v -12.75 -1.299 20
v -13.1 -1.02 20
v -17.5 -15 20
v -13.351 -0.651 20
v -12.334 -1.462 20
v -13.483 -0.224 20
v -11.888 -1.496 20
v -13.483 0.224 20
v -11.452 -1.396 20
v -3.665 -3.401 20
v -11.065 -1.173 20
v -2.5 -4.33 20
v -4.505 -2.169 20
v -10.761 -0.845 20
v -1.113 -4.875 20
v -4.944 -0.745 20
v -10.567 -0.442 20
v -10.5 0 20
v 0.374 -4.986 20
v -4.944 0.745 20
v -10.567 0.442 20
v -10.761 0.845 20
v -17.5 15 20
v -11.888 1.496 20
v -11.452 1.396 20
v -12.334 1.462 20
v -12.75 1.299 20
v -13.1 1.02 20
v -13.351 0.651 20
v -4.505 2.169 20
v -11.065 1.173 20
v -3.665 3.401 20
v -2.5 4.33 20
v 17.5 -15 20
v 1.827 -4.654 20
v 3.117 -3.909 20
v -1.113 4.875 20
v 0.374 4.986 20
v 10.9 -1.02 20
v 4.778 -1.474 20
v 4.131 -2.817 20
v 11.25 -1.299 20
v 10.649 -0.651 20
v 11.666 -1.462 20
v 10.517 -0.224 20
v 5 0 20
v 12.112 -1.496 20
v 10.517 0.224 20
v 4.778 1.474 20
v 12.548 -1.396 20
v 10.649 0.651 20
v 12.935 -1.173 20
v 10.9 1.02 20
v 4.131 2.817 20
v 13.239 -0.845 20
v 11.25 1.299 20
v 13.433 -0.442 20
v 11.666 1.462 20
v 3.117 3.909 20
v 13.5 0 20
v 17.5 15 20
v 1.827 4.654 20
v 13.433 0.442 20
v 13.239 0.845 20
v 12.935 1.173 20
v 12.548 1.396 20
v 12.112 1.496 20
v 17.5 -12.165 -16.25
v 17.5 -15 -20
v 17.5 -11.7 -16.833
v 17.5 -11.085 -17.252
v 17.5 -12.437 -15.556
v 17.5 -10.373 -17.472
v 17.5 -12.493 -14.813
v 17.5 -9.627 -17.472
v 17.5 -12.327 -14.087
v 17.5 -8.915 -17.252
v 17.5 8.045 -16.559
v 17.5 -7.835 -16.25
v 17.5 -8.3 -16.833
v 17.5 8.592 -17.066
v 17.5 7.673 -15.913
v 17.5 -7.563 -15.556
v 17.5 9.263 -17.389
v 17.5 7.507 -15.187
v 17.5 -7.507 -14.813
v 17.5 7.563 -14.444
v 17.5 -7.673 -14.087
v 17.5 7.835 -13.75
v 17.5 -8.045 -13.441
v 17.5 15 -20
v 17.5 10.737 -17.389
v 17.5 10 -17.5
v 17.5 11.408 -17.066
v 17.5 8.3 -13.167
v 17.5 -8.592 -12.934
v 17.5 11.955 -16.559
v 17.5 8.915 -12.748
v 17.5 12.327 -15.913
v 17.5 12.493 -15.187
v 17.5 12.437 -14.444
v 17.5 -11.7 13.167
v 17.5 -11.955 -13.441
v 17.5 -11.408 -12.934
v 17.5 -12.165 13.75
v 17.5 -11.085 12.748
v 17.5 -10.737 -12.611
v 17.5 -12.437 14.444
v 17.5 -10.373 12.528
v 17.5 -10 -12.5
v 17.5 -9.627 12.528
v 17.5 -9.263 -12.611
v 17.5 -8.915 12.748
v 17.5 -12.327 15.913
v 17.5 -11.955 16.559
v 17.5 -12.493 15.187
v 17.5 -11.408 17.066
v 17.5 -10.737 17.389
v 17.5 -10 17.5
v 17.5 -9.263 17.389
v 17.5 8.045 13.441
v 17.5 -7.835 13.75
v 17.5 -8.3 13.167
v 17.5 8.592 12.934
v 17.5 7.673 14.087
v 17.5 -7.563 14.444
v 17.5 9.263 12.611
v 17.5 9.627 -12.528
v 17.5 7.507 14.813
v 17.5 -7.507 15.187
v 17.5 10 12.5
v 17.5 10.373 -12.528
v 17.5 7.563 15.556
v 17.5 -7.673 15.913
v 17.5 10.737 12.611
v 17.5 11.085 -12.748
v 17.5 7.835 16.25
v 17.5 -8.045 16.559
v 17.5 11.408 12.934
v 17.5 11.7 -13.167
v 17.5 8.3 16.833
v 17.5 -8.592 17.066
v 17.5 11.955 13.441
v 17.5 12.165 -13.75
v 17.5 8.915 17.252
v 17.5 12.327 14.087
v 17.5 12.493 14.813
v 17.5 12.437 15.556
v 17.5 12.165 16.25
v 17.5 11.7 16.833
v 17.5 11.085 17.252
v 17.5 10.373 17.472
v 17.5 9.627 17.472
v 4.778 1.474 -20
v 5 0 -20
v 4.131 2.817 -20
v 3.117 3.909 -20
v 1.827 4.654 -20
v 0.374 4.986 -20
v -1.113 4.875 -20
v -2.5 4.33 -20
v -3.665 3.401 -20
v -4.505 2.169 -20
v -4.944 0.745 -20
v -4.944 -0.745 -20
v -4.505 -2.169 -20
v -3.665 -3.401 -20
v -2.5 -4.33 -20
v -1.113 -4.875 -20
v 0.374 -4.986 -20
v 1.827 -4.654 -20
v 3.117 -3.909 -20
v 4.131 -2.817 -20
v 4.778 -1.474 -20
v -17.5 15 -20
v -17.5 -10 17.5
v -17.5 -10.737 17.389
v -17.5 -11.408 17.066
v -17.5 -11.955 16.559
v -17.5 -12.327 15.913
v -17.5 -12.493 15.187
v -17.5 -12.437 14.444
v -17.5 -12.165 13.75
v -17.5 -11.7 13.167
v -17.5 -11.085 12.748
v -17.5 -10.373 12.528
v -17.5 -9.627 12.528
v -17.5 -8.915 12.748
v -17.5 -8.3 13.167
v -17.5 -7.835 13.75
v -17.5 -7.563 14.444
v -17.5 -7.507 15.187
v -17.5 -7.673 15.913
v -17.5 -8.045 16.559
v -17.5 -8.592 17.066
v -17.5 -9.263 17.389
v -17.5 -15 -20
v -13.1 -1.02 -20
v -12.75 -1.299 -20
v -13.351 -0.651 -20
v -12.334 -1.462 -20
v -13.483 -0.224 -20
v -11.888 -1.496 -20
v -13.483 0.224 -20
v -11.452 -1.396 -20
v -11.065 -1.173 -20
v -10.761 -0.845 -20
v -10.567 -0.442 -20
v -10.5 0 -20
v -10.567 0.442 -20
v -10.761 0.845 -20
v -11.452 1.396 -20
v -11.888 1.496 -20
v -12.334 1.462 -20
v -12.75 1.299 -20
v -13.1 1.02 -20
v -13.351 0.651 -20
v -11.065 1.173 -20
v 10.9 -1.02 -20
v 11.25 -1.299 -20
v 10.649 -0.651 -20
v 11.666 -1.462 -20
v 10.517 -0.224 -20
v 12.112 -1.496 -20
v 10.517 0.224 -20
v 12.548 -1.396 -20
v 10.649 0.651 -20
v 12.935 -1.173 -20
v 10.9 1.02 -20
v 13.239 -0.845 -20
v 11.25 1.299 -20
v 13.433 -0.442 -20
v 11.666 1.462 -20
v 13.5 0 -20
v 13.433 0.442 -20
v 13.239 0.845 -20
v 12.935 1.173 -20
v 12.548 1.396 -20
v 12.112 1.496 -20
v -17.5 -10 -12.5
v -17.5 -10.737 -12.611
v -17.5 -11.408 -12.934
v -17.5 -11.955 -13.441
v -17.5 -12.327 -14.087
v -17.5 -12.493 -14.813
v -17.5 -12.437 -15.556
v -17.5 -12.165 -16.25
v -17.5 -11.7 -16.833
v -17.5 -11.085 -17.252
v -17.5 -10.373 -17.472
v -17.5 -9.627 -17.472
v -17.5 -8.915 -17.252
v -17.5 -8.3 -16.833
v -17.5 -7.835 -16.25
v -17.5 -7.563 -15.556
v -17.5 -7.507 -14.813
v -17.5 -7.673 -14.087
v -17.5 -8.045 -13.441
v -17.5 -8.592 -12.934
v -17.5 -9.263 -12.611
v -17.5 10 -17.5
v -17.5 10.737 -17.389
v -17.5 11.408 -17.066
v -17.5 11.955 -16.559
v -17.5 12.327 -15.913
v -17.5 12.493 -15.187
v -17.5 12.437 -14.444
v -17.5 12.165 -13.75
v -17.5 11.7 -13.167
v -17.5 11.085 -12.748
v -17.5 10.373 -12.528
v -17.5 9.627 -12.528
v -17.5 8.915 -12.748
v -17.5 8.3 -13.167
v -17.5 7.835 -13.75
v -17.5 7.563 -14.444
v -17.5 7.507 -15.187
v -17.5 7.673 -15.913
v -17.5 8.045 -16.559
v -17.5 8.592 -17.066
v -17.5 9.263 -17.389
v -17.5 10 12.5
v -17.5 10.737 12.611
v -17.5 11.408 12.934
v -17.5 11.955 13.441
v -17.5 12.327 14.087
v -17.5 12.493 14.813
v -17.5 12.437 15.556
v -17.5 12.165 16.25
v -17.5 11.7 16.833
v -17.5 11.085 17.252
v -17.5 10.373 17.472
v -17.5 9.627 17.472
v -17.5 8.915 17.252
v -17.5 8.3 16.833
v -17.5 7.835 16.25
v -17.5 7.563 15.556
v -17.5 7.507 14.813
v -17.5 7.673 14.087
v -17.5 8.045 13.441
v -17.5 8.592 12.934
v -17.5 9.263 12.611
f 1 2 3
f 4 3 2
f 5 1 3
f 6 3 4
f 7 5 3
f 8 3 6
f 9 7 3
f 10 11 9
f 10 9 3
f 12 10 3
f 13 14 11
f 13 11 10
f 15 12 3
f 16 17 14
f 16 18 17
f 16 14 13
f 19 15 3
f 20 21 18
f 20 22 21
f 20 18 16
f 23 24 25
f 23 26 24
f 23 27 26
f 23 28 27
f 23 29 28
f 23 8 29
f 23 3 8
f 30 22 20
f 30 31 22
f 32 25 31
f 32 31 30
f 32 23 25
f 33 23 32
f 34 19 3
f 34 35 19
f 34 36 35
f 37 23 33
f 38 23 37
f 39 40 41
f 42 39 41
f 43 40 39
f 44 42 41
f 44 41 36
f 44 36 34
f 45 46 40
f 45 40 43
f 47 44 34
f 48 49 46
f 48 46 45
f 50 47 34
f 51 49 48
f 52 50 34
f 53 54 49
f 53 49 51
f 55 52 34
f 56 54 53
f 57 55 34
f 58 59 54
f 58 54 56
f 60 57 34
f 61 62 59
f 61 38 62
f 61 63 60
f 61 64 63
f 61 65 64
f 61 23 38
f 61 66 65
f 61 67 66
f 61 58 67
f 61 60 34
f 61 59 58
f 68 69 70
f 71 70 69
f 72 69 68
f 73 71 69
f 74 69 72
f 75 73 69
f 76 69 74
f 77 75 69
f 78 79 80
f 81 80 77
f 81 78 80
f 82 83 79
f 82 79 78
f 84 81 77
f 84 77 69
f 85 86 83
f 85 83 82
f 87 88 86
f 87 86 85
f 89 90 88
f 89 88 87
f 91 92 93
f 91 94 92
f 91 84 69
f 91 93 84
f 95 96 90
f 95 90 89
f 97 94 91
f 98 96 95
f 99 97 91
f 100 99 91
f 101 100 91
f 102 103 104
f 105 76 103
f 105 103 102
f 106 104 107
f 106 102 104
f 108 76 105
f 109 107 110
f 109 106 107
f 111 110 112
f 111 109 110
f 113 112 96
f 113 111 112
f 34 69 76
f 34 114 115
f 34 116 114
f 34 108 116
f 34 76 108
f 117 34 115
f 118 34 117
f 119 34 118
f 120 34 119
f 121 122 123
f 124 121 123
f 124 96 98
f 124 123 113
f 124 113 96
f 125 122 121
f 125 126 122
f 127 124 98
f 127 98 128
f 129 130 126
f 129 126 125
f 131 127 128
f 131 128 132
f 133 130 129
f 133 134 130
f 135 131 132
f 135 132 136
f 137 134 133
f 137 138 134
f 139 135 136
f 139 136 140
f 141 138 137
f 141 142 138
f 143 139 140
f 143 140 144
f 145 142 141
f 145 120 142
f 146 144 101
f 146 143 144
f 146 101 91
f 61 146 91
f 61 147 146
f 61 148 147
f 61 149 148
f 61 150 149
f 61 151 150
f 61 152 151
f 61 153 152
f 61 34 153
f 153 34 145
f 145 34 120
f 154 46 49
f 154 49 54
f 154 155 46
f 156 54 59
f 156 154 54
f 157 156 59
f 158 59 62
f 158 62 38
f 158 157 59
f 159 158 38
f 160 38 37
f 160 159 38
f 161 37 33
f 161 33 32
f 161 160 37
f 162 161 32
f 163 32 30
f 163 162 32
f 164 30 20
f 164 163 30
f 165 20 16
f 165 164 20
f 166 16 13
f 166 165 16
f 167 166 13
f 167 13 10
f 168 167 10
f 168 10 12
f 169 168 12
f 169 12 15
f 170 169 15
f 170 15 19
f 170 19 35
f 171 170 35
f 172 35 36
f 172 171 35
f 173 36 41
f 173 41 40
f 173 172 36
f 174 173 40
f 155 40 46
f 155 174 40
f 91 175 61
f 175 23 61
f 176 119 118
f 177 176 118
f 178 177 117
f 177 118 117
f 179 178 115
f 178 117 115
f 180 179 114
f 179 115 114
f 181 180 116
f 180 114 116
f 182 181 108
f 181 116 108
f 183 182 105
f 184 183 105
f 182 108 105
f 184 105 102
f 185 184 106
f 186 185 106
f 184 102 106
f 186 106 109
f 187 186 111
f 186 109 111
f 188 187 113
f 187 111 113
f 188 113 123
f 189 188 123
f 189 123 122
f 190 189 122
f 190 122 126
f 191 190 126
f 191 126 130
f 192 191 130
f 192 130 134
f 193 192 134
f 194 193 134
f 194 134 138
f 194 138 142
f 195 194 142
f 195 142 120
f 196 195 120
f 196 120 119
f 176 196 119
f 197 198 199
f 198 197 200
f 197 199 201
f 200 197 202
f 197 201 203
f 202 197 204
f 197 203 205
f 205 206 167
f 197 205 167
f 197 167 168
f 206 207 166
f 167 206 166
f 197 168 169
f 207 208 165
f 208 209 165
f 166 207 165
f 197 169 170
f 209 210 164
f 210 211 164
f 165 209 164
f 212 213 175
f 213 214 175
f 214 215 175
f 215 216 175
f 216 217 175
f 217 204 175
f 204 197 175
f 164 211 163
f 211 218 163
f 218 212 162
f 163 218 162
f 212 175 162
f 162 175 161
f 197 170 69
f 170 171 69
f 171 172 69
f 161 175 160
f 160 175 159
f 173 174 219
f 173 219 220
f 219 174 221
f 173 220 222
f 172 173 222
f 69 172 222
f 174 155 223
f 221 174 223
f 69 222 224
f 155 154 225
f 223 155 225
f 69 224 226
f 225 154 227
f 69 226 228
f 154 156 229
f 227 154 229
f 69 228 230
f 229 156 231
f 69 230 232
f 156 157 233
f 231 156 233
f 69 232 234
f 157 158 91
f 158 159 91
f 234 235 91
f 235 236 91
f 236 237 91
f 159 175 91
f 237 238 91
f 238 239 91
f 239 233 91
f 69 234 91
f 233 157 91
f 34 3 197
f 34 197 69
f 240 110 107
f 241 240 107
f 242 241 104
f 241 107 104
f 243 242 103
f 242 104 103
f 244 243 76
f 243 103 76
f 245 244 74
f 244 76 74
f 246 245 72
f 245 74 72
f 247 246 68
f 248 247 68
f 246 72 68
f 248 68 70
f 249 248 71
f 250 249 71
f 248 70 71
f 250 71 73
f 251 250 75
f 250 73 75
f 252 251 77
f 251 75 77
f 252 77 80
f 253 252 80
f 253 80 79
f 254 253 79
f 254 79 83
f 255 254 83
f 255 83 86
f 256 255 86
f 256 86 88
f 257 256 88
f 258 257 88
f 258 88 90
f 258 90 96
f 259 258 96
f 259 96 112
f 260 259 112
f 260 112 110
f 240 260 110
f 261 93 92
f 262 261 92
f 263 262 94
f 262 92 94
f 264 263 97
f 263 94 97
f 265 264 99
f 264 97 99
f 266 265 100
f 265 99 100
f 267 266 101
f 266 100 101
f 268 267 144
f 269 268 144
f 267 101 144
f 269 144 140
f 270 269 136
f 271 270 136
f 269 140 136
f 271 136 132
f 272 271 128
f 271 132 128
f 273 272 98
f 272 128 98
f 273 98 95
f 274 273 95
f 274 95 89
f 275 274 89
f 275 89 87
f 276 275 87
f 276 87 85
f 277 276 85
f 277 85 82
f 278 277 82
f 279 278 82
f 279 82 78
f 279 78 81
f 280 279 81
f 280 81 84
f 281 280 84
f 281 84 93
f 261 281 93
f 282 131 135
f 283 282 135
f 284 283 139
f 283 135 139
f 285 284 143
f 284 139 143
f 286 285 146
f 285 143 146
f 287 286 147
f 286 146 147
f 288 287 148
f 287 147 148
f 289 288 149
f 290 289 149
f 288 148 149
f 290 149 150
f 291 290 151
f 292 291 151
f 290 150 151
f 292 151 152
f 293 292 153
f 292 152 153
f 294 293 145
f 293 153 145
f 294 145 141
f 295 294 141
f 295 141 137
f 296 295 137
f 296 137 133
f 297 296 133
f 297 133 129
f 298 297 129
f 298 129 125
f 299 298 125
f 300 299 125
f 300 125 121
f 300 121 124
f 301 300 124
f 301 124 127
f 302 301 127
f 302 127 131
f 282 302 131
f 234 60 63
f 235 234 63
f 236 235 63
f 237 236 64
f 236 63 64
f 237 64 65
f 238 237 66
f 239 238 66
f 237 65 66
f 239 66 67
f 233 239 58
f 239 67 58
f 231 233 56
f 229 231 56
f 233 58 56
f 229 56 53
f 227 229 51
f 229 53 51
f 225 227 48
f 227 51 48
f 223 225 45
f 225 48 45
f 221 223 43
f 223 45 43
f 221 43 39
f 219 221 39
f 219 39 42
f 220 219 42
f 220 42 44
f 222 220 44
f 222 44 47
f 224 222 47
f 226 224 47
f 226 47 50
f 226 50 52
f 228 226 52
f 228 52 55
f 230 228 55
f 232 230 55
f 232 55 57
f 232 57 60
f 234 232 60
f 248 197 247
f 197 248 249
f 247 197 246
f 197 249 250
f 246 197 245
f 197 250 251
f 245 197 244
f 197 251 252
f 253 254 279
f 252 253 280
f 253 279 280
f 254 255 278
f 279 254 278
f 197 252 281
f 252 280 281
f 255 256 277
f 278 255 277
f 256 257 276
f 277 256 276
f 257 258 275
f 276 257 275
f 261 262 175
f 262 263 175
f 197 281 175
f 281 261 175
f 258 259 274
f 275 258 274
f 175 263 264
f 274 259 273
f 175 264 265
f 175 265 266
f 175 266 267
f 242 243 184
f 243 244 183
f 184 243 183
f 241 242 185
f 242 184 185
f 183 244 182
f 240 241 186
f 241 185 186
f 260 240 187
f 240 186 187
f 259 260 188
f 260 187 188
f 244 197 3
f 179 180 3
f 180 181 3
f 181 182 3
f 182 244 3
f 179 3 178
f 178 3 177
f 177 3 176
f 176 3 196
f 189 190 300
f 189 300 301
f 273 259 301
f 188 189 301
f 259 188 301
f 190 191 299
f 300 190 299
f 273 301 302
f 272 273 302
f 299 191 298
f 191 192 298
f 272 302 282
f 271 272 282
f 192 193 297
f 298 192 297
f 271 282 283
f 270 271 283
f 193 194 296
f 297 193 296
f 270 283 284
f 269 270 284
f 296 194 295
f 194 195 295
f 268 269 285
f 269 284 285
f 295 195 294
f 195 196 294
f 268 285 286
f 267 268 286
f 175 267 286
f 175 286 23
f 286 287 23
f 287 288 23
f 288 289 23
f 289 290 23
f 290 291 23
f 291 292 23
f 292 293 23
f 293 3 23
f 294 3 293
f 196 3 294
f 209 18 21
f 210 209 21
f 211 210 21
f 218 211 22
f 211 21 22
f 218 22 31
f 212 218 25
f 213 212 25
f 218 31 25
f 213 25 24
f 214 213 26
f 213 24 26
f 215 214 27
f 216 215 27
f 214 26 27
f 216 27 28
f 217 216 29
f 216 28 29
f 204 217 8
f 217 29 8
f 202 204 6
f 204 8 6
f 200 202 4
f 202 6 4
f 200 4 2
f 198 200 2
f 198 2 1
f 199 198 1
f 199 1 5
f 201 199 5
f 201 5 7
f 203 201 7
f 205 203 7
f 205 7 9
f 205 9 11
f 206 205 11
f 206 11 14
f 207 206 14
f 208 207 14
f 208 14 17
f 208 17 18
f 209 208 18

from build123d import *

# Parameters (mm, degrees)
SKETCH1_W           = 35
SKETCH1_H           = 30
SKETCH1_R           = 5
BOSS_EXTRUDE1_DEPTH = 20
SKETCH2_R           = 2.5
CUT_EXTRUDE1_DEPTH  = 44.011626335
SKETCH3_R           = 1.5
CUT_EXTRUDE2_DEPTH  = 47.165463282


with BuildPart() as part:
    # Sketch1 → Boss-Extrude1 (new, symmetric)
    with BuildSketch(Plane.XY):
        Rectangle(SKETCH1_W, SKETCH1_H)
        Circle(SKETCH1_R, mode=Mode.SUBTRACT)
    extrude(amount=BOSS_EXTRUDE1_DEPTH, both=True)

    # Sketch2 → Cut-Extrude1 (cut, through all)
    with BuildSketch(Plane(origin=(17.5, 0, 0), x_dir=(0, 0, -1), z_dir=(1, 0, 0))):
        with Locations((-15, 10)):
            Circle(SKETCH2_R)
        with Locations((15, 10)):
            Circle(SKETCH2_R)
        with Locations(Location((15, -10, 0), (0, 0, 180))):
            Circle(SKETCH2_R)
        with Locations(Location((-15, -10, 0), (0, 0, 180))):
            Circle(SKETCH2_R)
    extrude(amount=-CUT_EXTRUDE1_DEPTH, mode=Mode.SUBTRACT)

    # Sketch3 → Cut-Extrude2 (cut, through all)
    with BuildSketch(Plane.XY.offset(20)):
        with Locations((12, 0)):
            Circle(SKETCH3_R)
        with Locations((-12, 0)):
            Circle(SKETCH3_R)
    extrude(amount=-CUT_EXTRUDE2_DEPTH, mode=Mode.SUBTRACT)


solid = part.part
